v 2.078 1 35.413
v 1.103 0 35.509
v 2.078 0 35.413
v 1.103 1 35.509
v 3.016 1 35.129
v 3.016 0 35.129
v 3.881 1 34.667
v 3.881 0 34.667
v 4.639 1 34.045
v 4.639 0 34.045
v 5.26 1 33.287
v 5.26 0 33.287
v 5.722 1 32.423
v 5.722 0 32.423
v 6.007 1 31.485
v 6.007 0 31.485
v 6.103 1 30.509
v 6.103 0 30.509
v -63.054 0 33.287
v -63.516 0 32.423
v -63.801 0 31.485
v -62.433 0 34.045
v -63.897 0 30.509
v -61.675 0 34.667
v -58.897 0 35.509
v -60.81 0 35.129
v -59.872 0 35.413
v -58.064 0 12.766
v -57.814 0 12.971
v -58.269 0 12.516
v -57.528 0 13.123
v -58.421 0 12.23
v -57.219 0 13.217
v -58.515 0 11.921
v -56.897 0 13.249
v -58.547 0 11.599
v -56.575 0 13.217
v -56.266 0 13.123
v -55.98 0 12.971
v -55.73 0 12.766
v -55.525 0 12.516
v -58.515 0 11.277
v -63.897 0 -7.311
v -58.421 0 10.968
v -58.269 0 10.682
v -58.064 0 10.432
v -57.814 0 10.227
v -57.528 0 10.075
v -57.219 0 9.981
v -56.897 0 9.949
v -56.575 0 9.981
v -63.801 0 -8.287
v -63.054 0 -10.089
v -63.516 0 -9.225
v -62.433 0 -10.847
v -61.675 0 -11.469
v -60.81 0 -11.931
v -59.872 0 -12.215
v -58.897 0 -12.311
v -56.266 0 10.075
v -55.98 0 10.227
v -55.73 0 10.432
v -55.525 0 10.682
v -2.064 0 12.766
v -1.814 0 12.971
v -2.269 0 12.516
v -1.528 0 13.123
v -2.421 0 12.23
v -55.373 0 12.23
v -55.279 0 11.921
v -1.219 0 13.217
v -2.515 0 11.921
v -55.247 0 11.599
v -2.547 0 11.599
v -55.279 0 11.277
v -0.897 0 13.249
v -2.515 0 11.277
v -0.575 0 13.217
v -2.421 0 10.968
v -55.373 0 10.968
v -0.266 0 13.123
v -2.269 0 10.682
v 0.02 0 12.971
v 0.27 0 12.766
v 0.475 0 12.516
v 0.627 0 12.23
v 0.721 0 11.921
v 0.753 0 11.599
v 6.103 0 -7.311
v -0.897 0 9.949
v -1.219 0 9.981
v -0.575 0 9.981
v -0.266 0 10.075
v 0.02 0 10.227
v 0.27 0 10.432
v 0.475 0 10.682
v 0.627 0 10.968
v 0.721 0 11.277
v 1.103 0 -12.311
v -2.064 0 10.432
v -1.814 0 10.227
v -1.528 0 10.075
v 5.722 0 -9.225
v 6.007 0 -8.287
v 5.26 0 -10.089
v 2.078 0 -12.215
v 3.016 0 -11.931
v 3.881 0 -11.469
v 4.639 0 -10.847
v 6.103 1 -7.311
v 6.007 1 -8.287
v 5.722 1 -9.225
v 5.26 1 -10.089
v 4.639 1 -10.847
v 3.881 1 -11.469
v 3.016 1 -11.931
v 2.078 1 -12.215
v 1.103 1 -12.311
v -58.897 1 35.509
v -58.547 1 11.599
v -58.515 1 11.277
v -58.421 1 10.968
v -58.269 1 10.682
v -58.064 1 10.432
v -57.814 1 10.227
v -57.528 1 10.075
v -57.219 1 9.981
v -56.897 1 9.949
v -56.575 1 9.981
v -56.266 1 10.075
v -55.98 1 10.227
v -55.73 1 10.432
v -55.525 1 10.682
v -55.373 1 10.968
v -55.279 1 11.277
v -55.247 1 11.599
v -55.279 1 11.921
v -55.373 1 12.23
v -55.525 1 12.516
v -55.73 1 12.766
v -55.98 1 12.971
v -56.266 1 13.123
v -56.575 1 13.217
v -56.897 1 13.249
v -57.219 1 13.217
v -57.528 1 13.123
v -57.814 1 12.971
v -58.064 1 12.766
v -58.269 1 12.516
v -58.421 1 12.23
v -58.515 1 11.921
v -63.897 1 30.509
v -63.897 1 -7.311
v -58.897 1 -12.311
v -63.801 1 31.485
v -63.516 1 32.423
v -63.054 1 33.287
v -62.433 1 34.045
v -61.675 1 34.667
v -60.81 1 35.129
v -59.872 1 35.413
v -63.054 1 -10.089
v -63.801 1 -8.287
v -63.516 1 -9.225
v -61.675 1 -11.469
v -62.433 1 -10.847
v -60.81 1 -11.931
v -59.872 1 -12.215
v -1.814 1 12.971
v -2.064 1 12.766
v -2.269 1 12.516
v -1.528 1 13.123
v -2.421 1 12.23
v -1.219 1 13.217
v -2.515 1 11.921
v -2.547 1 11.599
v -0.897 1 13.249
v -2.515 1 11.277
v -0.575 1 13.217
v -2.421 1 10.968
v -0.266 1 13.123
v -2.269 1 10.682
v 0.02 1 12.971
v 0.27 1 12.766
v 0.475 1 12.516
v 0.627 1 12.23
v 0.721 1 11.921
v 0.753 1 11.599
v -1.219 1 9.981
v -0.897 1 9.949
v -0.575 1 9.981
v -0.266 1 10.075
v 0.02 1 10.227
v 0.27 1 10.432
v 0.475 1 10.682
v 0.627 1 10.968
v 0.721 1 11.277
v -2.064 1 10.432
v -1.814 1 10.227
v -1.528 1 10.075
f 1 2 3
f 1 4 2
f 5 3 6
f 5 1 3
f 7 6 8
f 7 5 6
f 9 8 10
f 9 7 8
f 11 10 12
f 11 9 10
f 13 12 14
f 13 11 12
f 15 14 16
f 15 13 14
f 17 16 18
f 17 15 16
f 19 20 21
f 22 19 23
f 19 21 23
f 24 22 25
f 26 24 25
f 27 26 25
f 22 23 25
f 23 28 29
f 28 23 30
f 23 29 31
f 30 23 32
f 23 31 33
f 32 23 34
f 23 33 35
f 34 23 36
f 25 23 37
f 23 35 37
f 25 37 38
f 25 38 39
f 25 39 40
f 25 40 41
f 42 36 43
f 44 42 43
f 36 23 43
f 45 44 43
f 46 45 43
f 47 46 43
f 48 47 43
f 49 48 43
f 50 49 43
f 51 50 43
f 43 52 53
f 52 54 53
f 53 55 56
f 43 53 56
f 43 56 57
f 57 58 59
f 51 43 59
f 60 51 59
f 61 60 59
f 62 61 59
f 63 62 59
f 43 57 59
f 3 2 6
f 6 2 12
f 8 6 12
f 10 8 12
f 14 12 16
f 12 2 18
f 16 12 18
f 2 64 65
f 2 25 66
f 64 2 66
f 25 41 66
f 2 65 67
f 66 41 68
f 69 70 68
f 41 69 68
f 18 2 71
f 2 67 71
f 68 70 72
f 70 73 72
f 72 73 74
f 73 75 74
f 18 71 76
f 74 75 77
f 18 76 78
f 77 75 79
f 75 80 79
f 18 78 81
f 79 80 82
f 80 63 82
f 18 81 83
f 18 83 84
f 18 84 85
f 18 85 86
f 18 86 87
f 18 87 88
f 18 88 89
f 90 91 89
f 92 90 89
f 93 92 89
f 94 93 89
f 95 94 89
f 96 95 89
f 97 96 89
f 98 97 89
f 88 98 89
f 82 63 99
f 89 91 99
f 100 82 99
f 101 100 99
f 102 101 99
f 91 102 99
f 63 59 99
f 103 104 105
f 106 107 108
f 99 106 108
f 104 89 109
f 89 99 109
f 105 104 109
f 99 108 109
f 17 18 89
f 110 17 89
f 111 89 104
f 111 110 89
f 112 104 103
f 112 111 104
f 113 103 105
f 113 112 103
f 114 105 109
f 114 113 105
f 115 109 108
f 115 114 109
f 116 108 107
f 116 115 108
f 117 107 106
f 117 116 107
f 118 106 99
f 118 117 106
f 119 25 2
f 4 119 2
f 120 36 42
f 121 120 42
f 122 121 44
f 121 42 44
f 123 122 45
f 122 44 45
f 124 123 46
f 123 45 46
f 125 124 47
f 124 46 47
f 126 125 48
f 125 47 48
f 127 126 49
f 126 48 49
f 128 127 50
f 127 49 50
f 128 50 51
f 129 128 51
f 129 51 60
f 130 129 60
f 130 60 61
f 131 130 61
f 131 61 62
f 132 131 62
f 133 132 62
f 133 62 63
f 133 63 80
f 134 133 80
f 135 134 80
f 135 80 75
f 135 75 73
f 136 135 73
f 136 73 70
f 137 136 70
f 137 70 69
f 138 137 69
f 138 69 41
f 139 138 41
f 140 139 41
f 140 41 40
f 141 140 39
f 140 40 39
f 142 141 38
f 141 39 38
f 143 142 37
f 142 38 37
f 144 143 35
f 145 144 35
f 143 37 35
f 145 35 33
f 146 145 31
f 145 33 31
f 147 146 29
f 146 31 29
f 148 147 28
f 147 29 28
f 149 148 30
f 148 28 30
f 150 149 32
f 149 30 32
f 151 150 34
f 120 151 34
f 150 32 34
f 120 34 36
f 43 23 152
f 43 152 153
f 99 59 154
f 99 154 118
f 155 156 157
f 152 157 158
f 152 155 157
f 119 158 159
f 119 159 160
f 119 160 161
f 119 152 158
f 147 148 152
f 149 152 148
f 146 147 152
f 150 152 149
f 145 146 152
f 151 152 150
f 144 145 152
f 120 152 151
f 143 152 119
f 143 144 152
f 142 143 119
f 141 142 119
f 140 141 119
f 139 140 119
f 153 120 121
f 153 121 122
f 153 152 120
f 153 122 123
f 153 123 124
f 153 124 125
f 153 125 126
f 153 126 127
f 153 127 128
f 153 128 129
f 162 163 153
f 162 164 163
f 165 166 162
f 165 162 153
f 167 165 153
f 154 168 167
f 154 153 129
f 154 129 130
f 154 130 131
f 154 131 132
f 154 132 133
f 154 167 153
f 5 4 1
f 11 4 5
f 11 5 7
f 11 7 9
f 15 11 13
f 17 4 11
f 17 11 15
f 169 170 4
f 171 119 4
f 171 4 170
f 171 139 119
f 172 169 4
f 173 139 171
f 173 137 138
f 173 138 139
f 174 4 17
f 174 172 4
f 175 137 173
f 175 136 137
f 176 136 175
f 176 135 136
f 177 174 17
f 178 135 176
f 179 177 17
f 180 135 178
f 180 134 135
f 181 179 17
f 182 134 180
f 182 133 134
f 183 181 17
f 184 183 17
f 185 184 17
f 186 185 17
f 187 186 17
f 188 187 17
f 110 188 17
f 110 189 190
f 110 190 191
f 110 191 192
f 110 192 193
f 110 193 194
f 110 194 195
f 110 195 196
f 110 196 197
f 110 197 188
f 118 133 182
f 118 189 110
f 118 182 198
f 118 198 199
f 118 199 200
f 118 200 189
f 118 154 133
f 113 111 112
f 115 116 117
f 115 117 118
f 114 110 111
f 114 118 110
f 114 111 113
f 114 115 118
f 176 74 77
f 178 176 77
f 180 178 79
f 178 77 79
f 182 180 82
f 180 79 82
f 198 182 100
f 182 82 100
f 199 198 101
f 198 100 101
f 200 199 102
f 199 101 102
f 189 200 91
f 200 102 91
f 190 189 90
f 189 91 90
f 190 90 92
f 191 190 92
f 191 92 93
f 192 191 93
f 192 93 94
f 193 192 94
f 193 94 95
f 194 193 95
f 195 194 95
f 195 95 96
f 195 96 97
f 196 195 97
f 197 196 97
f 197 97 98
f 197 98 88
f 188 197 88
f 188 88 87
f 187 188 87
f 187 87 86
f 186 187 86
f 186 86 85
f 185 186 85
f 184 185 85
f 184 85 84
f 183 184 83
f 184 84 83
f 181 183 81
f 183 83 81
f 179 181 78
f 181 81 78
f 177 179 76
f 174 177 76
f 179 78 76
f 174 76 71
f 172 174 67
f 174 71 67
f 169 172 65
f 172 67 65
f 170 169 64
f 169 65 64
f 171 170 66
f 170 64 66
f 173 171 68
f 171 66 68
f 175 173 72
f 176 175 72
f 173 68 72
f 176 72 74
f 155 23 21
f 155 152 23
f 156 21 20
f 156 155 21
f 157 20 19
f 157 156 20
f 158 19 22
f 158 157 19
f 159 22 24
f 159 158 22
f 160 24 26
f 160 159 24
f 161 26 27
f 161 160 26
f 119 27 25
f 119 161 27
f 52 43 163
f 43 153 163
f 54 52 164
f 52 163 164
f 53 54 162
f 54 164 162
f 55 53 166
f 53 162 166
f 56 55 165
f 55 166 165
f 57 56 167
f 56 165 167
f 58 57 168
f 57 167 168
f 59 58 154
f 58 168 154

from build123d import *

# Parameters (mm, degrees)
CROQUIS1_W                = 70
CROQUIS1_H                = 47.820638631
SALIENTE_EXTRUIR1_DEPTH   = 1
REDONDEO1_R               = 5
TALADRO_ROSCADO_M41_D     = 3.3
TALADRO_ROSCADO_M41_DEPTH = 11.5
TALADRO_ROSCADO_M41_TIP   = 0.991420021


with BuildPart() as part:
    # Croquis1 → Saliente-Extruir1 (new body)
    with BuildSketch(Plane(origin=(0, 0, 0), x_dir=(1, 0, 0), z_dir=(0, 1, 0))):
        with Locations((-28.897022241, -11.598967779)):
            Rectangle(CROQUIS1_W, CROQUIS1_H)
    extrude(amount=SALIENTE_EXTRUIR1_DEPTH)

    # Redondeo1
    redondeo1_edges = [part.edges().sort_by_distance(p)[0] for p in [
        (6.102977759, 0.5, 35.509287094),
        (-63.897022241, 0.5, 35.509287094),
        (-63.897022241, 0.5, -12.311351537),
        (6.102977759, 0.5, -12.311351537),
    ]]
    fillet(redondeo1_edges, radius=REDONDEO1_R)

    # Taladro roscado M41
    with Locations(Plane(origin=(0, 1, 0), x_dir=(1, 0, 0), z_dir=(0, 1, 0))):
        with Locations((-56.897022241, -11.598967779), (-0.897022241, -11.598967779)):
            Hole(TALADRO_ROSCADO_M41_D / 2, depth=TALADRO_ROSCADO_M41_DEPTH)
            with Locations((0, 0, -(TALADRO_ROSCADO_M41_DEPTH + TALADRO_ROSCADO_M41_TIP / 2))):  # 118° drill point
                Cone(0, TALADRO_ROSCADO_M41_D / 2, TALADRO_ROSCADO_M41_TIP, mode=Mode.SUBTRACT)


solid = part.part
